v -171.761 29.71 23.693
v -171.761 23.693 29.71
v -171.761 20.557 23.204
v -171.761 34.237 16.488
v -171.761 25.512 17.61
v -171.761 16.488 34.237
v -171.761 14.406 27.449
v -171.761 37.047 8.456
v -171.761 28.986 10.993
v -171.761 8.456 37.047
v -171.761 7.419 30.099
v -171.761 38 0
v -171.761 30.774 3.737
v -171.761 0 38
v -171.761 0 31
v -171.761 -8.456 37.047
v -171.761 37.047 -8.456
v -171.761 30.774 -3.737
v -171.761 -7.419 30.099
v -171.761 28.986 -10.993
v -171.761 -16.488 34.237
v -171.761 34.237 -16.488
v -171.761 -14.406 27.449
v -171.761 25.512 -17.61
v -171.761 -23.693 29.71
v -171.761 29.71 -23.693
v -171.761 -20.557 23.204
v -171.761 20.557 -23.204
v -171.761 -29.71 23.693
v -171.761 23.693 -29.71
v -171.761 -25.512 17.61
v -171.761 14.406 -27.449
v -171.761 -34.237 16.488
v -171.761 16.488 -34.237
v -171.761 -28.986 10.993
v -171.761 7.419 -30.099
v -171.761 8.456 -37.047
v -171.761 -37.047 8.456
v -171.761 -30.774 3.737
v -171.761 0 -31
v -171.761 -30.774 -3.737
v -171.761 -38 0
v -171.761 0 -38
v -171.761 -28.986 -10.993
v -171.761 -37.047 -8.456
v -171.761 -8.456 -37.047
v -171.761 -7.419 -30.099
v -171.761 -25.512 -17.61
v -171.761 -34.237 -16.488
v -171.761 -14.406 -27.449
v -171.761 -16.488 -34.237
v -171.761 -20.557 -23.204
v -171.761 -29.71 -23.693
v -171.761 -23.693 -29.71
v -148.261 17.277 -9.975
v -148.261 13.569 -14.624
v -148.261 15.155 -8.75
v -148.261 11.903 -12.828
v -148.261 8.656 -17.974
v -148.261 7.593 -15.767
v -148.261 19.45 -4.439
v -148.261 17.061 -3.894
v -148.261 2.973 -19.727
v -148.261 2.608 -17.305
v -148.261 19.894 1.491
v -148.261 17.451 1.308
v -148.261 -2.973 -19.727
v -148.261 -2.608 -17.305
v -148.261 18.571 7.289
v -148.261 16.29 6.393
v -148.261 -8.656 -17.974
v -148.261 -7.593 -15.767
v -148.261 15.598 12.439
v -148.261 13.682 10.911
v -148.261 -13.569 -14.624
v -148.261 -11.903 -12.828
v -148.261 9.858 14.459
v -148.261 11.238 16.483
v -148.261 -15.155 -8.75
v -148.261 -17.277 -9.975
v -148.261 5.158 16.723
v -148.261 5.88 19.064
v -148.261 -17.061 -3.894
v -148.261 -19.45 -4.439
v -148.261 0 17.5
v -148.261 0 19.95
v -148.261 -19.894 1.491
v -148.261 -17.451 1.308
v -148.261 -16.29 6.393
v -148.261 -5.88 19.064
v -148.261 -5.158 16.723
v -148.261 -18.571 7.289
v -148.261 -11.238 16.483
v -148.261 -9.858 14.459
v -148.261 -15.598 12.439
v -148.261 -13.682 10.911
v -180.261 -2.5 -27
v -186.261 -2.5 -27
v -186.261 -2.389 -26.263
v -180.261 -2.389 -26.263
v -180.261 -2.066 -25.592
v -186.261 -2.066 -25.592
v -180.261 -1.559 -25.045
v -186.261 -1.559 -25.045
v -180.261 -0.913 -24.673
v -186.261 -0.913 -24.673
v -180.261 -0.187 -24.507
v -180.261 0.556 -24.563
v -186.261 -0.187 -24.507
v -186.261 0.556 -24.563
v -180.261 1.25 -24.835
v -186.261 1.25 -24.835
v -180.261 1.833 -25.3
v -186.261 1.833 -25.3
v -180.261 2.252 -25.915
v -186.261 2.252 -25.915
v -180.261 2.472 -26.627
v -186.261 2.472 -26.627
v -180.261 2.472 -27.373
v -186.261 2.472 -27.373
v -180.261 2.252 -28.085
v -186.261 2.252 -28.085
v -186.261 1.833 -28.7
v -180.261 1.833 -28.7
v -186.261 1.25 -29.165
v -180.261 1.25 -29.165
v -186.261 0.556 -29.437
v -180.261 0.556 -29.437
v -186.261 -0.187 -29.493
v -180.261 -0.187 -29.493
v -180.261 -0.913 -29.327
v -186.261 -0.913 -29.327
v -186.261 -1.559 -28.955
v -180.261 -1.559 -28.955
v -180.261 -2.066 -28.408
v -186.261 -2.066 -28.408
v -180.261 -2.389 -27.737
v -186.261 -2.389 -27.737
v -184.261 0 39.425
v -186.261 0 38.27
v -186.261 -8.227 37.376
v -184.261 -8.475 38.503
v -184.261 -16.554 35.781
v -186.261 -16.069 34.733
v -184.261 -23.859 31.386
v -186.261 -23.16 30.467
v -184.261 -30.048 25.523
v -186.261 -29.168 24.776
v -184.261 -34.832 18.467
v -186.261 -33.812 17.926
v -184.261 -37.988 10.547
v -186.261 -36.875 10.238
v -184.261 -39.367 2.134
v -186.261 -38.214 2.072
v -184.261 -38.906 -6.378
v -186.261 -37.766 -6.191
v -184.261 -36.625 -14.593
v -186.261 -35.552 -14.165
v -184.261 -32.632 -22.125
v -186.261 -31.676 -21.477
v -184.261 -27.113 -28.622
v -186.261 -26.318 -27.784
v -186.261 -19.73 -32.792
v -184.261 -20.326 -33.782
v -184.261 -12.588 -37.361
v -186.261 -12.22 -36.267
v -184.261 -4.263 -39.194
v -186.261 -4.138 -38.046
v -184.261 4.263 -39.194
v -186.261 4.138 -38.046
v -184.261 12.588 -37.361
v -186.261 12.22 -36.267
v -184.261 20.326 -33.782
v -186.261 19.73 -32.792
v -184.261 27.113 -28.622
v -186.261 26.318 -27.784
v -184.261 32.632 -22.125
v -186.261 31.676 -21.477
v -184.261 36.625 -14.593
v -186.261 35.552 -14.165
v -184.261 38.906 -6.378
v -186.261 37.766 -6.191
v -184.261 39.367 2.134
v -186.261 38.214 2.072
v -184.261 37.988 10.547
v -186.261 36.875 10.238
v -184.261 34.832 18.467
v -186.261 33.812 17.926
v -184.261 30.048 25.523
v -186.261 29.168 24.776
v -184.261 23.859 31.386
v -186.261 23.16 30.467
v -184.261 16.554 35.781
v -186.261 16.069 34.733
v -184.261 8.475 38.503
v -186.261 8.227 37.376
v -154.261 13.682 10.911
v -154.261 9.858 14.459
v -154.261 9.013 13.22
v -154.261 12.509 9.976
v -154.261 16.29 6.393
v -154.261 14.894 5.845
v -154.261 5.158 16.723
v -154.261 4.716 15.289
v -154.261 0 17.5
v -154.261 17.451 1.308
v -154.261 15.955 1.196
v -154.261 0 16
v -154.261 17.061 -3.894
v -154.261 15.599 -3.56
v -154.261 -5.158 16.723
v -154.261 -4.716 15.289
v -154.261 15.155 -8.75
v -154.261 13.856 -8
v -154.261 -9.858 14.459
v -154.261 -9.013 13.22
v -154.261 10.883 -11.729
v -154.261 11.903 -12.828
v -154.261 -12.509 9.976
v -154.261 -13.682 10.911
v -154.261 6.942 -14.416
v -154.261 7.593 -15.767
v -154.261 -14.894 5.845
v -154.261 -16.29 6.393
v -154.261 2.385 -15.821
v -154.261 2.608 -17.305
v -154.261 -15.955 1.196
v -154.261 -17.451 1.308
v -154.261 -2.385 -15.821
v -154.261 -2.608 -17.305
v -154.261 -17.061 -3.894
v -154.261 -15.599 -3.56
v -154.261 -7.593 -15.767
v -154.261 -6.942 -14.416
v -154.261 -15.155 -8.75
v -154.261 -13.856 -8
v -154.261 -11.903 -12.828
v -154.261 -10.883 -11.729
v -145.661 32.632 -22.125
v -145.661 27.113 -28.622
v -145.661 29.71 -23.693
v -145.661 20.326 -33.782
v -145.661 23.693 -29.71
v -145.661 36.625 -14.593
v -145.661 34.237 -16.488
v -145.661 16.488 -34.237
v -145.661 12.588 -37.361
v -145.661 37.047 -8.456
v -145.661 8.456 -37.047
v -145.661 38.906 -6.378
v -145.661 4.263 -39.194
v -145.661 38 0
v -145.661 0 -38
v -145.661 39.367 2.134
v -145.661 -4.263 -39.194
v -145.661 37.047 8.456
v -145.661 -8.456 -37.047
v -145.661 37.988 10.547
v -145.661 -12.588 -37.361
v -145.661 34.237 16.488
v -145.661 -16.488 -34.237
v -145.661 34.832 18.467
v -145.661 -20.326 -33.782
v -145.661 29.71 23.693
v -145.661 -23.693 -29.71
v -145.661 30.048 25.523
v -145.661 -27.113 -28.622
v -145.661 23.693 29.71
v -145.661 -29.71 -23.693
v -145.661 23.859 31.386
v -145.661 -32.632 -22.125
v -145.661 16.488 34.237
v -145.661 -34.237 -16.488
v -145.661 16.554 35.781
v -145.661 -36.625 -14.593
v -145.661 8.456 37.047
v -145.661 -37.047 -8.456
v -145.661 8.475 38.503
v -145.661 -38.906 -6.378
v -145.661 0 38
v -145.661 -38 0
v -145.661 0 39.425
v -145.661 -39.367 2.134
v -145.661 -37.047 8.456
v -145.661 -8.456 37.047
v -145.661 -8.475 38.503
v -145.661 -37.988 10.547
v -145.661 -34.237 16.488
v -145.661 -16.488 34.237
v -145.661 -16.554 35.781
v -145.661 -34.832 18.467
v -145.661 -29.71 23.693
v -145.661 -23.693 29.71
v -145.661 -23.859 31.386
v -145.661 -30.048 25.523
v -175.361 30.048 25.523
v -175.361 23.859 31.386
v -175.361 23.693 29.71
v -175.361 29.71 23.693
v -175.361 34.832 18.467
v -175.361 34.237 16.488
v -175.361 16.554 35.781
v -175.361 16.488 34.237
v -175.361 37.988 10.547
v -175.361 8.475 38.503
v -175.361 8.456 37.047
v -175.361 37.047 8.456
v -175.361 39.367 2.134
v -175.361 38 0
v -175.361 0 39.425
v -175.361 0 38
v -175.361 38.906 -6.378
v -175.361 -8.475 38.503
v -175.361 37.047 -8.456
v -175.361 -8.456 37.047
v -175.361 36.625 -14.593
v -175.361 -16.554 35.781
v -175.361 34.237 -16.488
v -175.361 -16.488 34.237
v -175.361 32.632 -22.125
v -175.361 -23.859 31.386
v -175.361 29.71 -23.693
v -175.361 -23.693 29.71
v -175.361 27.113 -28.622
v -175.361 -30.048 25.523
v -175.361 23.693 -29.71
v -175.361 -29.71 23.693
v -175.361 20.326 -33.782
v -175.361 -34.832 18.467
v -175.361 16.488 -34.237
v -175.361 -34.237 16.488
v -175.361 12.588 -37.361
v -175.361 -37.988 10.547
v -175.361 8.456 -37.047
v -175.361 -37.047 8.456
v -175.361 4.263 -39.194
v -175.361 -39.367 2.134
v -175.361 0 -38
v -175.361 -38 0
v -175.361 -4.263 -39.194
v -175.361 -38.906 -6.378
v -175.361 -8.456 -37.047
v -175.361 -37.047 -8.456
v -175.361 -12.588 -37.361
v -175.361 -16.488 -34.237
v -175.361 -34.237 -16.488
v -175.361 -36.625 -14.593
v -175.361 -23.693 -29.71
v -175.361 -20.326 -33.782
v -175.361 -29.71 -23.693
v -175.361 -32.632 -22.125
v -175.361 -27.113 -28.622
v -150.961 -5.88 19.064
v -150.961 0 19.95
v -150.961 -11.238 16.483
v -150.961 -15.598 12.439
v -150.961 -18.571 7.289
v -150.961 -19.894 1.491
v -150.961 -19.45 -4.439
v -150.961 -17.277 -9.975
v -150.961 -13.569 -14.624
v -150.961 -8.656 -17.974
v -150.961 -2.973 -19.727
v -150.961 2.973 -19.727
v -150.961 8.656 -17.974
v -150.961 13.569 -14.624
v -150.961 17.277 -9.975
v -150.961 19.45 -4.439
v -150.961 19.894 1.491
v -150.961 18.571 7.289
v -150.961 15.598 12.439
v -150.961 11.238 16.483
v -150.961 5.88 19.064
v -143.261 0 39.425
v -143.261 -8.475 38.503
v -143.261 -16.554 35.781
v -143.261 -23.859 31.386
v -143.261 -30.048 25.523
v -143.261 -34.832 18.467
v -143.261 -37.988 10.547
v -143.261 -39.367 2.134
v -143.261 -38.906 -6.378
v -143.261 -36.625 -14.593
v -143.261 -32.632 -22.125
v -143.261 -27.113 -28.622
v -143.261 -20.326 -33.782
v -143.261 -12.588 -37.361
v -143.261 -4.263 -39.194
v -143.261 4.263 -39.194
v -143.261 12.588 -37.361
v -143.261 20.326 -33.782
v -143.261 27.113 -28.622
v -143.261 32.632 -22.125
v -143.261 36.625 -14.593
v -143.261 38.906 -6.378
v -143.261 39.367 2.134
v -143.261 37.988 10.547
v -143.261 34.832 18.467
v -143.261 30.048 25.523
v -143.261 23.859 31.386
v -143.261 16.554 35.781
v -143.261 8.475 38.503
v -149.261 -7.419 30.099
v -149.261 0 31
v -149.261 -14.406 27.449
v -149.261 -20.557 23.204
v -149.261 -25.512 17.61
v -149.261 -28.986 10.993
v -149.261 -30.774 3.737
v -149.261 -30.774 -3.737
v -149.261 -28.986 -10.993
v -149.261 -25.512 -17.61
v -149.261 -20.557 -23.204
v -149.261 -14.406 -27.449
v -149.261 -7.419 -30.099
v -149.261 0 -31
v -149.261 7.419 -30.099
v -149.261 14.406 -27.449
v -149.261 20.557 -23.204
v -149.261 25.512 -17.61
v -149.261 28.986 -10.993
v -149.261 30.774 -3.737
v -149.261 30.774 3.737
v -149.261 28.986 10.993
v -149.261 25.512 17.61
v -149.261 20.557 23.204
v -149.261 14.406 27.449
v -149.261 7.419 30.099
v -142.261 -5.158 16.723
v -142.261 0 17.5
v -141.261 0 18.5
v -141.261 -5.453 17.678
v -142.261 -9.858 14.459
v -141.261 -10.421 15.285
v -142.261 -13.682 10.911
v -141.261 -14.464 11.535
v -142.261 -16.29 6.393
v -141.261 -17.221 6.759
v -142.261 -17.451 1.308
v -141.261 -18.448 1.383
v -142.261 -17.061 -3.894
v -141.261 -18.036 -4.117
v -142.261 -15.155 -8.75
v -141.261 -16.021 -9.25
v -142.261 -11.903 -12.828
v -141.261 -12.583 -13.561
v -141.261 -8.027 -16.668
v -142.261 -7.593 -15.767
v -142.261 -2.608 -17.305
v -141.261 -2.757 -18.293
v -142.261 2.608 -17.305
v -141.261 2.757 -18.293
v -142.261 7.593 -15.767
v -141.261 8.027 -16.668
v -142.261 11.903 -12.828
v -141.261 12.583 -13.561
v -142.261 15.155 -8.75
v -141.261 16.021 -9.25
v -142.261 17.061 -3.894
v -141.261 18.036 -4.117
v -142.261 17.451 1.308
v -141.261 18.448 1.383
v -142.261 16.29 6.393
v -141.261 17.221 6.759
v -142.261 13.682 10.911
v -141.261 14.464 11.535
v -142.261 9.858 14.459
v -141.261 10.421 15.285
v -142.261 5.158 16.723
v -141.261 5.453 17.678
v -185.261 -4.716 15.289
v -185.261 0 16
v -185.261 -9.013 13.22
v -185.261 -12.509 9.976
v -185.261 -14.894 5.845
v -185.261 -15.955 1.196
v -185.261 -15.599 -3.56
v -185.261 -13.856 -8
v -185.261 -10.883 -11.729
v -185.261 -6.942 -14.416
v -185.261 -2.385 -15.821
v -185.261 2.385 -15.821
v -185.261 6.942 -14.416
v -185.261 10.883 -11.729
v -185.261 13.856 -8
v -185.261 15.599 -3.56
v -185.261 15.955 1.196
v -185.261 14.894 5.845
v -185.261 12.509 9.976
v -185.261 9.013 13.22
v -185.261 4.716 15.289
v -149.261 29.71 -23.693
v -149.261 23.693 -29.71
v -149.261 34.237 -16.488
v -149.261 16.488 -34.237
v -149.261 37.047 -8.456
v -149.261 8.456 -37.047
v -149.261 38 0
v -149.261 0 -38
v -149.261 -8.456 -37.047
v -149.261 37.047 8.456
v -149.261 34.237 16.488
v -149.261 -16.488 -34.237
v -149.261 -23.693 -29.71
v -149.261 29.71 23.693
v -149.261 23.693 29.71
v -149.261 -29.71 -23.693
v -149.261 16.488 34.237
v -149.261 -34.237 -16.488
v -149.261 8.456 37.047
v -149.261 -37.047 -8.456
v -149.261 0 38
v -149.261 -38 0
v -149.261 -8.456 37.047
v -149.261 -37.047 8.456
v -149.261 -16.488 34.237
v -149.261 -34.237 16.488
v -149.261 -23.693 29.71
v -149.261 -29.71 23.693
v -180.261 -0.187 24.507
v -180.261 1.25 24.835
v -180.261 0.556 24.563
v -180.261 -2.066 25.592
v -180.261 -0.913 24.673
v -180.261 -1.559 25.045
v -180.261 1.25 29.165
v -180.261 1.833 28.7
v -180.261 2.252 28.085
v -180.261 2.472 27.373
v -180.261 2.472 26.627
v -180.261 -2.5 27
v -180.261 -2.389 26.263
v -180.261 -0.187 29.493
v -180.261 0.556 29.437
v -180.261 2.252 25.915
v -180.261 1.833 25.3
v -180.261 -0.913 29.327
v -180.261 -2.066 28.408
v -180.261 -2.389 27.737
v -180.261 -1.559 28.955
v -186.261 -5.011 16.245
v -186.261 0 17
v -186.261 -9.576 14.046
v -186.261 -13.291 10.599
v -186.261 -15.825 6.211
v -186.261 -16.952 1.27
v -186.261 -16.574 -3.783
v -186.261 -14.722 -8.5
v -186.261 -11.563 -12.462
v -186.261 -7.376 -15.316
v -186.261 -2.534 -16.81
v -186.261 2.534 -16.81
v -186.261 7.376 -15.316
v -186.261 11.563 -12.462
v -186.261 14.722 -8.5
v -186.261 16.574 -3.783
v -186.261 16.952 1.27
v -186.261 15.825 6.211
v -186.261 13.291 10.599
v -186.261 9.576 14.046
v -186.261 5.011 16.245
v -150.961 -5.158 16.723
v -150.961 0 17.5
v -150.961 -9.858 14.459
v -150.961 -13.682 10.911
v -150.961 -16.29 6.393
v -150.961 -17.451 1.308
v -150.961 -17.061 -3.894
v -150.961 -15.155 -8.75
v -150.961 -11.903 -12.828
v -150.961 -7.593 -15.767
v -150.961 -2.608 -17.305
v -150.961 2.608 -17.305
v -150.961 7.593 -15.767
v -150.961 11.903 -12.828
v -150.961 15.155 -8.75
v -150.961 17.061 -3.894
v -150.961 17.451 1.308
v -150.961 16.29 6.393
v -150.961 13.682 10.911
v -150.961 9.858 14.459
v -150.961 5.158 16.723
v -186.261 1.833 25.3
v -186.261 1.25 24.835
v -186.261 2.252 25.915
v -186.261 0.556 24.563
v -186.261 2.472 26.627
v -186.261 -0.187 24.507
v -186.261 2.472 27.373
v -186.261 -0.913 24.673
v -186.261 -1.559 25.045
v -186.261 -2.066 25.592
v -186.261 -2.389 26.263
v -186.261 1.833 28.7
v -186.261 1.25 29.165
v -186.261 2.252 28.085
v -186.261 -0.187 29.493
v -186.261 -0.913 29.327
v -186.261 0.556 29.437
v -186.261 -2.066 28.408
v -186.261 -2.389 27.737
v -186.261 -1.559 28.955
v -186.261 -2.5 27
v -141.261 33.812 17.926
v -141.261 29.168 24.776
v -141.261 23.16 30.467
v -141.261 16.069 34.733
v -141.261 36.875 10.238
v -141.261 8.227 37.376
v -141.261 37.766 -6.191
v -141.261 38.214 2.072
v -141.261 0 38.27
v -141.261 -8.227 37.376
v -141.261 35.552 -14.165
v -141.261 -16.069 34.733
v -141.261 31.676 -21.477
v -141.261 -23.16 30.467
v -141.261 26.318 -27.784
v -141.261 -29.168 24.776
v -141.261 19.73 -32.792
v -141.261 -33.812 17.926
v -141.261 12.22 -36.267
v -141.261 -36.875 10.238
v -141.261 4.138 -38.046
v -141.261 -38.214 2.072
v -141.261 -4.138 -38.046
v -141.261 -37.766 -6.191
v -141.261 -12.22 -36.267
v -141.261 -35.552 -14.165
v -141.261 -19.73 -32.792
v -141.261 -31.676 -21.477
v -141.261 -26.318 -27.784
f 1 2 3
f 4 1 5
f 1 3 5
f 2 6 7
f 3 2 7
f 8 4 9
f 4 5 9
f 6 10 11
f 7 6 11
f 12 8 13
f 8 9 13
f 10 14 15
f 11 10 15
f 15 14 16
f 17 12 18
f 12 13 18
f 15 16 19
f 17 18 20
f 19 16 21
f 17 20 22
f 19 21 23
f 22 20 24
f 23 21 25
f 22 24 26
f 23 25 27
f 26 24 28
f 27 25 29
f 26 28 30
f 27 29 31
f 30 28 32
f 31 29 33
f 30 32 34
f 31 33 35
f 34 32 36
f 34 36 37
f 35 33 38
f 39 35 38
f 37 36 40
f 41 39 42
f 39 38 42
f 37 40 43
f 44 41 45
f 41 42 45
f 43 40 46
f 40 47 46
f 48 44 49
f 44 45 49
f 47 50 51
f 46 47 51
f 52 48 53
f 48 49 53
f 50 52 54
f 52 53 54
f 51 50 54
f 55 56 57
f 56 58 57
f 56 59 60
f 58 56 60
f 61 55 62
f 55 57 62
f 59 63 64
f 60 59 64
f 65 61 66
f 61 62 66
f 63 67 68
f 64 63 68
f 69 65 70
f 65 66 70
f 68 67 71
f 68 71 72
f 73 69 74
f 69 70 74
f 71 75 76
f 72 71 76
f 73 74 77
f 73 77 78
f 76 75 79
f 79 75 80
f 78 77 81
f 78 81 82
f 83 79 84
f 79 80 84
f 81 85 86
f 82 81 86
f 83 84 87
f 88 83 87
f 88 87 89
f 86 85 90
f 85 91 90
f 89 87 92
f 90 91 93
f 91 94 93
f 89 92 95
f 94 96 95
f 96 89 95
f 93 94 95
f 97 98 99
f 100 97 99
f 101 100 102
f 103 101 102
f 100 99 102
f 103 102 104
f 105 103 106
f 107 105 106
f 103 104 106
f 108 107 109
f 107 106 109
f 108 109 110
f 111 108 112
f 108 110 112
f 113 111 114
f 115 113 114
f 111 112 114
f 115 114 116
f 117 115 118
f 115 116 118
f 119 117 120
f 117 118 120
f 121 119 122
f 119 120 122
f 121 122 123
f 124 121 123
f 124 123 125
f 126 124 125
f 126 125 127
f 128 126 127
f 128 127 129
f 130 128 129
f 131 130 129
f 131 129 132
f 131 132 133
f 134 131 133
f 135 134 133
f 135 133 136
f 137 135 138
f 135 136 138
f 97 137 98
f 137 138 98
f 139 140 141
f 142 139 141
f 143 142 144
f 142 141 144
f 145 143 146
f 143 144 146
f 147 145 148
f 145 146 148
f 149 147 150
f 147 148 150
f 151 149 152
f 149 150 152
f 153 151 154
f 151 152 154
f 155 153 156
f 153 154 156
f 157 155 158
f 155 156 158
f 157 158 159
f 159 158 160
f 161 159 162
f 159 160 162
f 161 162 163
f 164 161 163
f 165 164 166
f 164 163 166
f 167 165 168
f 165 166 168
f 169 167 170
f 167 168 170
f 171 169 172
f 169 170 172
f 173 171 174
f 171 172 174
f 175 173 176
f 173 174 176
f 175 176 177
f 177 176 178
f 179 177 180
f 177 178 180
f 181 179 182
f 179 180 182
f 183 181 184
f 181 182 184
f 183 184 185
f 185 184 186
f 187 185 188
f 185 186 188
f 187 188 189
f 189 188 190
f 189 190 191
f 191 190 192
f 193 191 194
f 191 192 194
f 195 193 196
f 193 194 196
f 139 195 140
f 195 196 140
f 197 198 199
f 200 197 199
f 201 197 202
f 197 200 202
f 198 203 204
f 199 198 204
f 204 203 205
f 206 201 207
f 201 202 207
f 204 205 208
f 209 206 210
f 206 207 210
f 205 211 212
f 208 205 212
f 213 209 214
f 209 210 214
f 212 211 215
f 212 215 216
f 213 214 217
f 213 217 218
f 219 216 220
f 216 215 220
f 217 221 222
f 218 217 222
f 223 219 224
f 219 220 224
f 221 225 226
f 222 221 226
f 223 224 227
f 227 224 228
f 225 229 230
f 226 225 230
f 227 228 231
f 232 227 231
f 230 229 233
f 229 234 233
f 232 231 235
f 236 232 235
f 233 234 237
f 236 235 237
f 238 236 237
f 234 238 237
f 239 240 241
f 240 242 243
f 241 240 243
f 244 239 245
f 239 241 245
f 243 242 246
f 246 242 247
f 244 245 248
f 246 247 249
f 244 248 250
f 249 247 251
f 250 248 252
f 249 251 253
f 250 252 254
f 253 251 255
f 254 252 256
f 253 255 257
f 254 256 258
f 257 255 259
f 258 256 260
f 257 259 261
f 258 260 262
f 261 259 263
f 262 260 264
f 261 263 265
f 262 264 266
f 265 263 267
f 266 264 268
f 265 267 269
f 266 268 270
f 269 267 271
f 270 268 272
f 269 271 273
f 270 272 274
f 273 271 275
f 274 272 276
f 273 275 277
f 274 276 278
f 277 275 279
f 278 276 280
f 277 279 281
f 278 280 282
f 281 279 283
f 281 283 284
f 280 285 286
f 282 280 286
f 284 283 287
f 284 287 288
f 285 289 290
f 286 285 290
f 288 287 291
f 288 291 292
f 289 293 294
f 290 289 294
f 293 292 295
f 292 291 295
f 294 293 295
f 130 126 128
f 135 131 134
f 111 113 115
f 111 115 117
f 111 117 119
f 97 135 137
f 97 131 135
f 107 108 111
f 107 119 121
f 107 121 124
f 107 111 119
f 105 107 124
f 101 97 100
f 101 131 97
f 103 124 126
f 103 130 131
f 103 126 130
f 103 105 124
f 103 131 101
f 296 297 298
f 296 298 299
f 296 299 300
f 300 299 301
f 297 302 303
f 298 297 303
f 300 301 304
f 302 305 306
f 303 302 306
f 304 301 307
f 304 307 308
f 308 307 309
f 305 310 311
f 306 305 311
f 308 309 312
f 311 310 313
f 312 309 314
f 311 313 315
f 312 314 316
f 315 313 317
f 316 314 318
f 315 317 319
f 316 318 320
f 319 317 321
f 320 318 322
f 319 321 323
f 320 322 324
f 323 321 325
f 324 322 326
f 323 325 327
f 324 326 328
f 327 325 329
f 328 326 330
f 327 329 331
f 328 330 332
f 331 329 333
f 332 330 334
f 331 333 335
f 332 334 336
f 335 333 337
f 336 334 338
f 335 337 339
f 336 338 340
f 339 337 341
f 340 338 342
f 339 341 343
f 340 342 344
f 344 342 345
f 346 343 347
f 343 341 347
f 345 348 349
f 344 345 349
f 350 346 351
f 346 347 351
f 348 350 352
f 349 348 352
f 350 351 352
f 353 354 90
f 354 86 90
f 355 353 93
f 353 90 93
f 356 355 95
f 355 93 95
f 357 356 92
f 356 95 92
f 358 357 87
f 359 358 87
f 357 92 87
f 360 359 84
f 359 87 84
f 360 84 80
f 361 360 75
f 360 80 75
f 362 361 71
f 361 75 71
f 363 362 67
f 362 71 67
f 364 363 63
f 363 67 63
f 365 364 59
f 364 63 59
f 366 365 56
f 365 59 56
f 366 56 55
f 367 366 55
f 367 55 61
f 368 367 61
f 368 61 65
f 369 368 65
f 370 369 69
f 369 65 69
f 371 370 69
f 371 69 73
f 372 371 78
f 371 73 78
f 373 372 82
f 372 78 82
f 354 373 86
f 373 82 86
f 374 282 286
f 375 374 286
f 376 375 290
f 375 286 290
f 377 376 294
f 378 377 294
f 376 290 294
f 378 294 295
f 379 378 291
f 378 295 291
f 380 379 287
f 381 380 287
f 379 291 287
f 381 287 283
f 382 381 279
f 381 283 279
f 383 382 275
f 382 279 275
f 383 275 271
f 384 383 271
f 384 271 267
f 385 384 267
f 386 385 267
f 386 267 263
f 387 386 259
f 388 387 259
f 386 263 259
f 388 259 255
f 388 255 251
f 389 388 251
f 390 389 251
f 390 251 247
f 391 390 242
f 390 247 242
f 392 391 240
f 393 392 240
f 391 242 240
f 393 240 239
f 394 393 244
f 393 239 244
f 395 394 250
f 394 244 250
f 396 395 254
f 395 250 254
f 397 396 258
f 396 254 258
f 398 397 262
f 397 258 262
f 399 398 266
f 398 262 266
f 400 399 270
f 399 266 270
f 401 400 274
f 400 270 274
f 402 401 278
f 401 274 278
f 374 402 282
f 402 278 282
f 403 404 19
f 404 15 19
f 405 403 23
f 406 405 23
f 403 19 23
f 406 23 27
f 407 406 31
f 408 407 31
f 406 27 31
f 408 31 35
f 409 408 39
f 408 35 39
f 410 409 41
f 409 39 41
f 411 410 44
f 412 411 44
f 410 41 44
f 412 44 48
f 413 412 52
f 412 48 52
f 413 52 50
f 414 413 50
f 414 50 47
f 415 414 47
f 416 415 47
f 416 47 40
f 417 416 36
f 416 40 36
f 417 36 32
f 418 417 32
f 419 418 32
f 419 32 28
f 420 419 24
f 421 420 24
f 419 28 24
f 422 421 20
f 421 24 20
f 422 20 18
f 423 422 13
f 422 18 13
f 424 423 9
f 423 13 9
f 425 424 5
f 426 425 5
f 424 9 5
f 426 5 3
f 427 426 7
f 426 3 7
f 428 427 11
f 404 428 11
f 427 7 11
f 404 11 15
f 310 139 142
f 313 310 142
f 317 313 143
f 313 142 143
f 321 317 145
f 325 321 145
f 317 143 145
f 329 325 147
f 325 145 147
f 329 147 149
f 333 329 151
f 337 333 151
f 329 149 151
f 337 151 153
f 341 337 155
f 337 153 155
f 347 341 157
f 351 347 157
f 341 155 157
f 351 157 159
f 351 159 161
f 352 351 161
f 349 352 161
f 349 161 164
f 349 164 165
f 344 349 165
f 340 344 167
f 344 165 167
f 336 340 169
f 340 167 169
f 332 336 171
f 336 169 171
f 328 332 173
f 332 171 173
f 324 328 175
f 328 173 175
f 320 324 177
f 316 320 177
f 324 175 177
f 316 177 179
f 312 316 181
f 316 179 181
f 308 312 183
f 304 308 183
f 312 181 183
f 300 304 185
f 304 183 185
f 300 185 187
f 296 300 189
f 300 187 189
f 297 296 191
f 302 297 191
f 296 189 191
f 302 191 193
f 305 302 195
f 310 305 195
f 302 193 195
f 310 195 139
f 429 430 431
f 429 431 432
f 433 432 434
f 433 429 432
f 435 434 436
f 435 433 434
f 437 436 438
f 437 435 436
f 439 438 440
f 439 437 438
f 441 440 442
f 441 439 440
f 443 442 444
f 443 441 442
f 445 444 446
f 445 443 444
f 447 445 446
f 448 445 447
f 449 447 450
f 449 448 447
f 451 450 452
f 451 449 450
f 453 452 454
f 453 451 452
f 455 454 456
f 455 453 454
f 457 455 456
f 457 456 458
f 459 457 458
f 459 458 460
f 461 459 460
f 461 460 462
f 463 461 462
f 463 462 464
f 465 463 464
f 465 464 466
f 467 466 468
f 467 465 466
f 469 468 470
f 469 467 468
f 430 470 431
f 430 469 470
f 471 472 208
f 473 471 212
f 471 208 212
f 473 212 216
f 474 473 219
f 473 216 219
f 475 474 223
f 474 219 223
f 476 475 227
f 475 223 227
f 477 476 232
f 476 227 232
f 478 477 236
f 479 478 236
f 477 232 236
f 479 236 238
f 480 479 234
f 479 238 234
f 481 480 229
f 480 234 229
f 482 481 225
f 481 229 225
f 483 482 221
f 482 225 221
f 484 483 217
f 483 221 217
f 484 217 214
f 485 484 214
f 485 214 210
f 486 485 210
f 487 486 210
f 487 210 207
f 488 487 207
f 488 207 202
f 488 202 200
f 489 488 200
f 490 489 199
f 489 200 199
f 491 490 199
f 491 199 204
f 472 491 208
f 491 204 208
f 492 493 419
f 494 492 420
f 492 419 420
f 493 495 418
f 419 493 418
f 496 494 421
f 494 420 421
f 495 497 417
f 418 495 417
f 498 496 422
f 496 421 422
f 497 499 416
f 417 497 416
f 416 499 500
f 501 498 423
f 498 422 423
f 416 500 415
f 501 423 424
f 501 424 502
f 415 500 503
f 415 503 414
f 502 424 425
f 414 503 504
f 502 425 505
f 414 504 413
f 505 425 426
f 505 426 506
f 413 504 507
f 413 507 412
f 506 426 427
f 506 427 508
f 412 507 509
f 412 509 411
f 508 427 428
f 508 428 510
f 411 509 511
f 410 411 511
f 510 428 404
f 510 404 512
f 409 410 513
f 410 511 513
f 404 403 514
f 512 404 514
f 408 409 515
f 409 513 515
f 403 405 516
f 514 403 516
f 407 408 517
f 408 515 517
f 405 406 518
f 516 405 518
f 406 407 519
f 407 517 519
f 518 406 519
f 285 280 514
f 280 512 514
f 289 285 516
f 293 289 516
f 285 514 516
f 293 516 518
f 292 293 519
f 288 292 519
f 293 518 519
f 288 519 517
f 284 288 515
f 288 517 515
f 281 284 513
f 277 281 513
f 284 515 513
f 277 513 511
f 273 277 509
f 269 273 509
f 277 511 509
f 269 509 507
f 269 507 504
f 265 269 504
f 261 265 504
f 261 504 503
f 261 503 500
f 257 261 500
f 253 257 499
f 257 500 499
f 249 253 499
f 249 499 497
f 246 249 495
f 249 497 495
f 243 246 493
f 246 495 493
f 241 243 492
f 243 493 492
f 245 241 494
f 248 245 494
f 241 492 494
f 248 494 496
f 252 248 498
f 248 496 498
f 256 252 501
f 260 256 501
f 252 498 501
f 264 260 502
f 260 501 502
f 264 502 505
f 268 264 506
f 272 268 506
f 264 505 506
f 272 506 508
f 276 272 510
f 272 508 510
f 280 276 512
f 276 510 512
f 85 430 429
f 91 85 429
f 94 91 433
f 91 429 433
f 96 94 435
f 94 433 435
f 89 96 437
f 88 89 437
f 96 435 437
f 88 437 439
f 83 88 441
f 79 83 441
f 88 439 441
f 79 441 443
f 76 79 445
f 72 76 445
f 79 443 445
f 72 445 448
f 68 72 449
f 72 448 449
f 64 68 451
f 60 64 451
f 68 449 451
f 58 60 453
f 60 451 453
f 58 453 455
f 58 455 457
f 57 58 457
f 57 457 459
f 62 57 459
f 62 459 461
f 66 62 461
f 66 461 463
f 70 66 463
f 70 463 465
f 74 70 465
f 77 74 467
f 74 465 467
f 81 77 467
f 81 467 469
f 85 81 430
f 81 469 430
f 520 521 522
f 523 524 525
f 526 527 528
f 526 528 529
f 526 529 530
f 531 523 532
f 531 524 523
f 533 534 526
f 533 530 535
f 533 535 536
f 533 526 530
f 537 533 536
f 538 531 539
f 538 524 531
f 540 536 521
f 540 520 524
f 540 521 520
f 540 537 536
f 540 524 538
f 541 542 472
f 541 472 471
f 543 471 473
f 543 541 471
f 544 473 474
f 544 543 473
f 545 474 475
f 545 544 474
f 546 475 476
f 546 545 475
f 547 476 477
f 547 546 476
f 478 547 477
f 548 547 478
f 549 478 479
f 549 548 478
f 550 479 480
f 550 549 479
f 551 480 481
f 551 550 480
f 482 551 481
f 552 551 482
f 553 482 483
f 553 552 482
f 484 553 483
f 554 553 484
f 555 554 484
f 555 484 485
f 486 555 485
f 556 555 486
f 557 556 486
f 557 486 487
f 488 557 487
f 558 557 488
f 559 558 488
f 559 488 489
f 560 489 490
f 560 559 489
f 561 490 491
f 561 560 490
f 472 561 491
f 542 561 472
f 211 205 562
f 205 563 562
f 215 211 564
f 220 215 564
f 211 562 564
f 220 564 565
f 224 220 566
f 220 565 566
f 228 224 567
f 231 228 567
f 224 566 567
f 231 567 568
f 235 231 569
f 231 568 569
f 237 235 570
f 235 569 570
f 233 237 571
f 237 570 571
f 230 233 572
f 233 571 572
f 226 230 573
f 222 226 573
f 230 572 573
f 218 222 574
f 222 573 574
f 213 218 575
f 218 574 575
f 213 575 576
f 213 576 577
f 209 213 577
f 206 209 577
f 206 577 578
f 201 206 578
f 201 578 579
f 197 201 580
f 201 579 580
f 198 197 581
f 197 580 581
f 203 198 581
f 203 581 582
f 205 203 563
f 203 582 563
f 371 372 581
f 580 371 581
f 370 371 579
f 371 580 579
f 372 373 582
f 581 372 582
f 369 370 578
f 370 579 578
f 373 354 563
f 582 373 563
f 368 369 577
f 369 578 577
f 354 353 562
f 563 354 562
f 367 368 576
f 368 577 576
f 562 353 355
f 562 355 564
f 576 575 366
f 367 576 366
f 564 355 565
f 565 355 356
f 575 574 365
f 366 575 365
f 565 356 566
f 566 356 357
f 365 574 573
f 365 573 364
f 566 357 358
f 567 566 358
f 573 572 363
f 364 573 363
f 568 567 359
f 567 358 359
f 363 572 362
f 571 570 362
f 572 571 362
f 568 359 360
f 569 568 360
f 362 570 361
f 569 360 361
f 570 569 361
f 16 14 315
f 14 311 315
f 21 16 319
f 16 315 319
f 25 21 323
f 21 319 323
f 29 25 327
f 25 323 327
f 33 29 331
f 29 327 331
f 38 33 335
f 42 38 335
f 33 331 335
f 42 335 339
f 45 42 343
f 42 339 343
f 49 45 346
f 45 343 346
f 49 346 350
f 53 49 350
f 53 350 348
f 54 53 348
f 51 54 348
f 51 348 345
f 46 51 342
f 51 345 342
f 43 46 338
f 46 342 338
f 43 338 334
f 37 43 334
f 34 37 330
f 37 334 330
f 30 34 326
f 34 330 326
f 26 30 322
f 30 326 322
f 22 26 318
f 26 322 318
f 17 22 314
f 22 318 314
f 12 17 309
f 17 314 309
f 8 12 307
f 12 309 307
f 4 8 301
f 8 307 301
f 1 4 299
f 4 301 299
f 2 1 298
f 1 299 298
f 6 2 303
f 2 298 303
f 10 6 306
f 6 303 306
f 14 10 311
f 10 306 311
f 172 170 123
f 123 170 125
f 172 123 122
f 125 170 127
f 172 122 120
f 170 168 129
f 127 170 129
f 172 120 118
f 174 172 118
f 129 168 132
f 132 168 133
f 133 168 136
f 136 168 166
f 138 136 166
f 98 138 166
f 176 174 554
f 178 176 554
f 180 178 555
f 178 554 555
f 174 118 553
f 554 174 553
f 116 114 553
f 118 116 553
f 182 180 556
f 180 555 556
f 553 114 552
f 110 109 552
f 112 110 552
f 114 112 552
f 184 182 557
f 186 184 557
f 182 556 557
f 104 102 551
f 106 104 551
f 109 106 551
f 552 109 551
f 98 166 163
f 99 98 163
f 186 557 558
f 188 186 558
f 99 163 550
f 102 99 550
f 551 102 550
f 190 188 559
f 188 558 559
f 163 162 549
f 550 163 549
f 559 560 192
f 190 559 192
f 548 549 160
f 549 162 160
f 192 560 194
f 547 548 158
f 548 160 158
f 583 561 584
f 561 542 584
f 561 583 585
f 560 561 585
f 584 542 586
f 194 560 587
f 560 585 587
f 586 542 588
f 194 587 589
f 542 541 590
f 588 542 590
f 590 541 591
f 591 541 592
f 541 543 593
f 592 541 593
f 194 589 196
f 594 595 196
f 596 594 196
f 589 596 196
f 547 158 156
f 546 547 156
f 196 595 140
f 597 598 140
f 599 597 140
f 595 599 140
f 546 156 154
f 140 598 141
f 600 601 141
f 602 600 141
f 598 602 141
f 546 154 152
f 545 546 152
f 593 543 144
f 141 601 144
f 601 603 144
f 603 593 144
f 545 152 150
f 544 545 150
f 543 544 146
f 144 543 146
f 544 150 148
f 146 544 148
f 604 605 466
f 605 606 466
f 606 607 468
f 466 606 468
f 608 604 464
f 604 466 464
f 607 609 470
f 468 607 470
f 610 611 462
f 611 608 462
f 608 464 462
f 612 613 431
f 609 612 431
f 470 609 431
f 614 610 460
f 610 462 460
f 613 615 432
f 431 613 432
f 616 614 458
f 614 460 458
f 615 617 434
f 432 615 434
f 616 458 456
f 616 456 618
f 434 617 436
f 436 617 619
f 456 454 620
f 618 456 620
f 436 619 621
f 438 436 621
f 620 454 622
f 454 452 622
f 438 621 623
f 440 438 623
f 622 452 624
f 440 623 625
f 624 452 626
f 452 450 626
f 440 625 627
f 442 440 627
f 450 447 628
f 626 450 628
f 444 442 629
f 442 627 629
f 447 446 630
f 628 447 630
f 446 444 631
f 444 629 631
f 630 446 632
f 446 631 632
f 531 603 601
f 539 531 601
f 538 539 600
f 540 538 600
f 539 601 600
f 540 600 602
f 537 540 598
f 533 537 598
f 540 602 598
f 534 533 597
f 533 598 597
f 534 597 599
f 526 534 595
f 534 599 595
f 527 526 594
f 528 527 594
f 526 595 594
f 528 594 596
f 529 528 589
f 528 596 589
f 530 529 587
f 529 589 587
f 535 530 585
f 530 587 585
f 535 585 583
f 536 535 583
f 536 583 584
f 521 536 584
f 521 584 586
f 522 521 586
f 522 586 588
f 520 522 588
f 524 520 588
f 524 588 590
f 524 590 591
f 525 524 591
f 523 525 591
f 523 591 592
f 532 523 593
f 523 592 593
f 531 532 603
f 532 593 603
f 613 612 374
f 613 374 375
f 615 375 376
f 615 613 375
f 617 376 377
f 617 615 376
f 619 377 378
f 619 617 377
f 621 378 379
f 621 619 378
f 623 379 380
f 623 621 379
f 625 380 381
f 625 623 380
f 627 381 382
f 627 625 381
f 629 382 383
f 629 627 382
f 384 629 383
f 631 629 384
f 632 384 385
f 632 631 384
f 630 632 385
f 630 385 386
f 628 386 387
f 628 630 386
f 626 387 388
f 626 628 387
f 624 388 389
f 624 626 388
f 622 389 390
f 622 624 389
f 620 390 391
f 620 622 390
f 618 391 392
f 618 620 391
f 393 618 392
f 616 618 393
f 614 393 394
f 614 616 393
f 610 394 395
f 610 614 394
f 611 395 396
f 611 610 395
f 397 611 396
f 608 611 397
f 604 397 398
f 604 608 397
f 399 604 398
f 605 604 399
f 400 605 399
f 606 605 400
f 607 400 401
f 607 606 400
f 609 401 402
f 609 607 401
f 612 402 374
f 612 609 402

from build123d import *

# Parameters (mm, degrees)
F2_SIZE2 = 1.154701
F2_SIZE  = 2
F3_R     = 2.5
F4_DEPTH = 6
F5_SIZE2 = 1.154701
F5_SIZE  = 2
F6_SIZE  = 1


with BuildPart() as f1:
    # F0 (on Front) → F1 (revolve)
    with BuildSketch(Plane.XZ):
        Polygon((-148.261028, 17.5), (-141.261028, 17.5), (-141.261028, 39.425), (-145.661028, 39.425), (-145.661028, 38), (-149.261028, 38), (-149.261028, 31), (-171.761028, 31), (-171.761028, 38), (-175.361028, 38), (-175.361028, 39.425), (-186.261028, 39.425), (-186.261028, 16), (-154.261028, 16), (-154.261028, 17.5), (-150.961028, 17.5), (-150.961028, 19.95), (-148.261028, 19.95), align=None)
    revolve(axis=Axis((28.175471, 0, 0), (1, 0, 0)))

    # F2
    f2_edges = [f1.edges().sort_by_distance(p)[0] for p in [
        (-186.261028, 0, -39.425),
    ]]
    chamfer(f2_edges, length=F2_SIZE, length2=F2_SIZE2)

    # F3 (on face) → F4 (cut)
    with BuildSketch(Plane(origin=(-186.261028, 0, 0), x_dir=(0, -1, 0), z_dir=(-1, 0, 0))):
        with Locations((0, 27)):
            Circle(F3_R)
        with Locations((0, -27)):
            Circle(F3_R)
    extrude(amount=-F4_DEPTH, mode=Mode.SUBTRACT)

    # F5
    f5_edges = [f1.edges().sort_by_distance(p)[0] for p in [
        (-141.261028, 0, -39.425),
    ]]
    chamfer(f5_edges, length=F5_SIZE, length2=F5_SIZE2)

    # F6
    f6_edges = [f1.edges().sort_by_distance(p)[0] for p in [
        (-186.261028, 0, -16),
        (-141.261028, 0, -17.5),
    ]]
    chamfer(f6_edges, length=F6_SIZE)


solid = f1.part
